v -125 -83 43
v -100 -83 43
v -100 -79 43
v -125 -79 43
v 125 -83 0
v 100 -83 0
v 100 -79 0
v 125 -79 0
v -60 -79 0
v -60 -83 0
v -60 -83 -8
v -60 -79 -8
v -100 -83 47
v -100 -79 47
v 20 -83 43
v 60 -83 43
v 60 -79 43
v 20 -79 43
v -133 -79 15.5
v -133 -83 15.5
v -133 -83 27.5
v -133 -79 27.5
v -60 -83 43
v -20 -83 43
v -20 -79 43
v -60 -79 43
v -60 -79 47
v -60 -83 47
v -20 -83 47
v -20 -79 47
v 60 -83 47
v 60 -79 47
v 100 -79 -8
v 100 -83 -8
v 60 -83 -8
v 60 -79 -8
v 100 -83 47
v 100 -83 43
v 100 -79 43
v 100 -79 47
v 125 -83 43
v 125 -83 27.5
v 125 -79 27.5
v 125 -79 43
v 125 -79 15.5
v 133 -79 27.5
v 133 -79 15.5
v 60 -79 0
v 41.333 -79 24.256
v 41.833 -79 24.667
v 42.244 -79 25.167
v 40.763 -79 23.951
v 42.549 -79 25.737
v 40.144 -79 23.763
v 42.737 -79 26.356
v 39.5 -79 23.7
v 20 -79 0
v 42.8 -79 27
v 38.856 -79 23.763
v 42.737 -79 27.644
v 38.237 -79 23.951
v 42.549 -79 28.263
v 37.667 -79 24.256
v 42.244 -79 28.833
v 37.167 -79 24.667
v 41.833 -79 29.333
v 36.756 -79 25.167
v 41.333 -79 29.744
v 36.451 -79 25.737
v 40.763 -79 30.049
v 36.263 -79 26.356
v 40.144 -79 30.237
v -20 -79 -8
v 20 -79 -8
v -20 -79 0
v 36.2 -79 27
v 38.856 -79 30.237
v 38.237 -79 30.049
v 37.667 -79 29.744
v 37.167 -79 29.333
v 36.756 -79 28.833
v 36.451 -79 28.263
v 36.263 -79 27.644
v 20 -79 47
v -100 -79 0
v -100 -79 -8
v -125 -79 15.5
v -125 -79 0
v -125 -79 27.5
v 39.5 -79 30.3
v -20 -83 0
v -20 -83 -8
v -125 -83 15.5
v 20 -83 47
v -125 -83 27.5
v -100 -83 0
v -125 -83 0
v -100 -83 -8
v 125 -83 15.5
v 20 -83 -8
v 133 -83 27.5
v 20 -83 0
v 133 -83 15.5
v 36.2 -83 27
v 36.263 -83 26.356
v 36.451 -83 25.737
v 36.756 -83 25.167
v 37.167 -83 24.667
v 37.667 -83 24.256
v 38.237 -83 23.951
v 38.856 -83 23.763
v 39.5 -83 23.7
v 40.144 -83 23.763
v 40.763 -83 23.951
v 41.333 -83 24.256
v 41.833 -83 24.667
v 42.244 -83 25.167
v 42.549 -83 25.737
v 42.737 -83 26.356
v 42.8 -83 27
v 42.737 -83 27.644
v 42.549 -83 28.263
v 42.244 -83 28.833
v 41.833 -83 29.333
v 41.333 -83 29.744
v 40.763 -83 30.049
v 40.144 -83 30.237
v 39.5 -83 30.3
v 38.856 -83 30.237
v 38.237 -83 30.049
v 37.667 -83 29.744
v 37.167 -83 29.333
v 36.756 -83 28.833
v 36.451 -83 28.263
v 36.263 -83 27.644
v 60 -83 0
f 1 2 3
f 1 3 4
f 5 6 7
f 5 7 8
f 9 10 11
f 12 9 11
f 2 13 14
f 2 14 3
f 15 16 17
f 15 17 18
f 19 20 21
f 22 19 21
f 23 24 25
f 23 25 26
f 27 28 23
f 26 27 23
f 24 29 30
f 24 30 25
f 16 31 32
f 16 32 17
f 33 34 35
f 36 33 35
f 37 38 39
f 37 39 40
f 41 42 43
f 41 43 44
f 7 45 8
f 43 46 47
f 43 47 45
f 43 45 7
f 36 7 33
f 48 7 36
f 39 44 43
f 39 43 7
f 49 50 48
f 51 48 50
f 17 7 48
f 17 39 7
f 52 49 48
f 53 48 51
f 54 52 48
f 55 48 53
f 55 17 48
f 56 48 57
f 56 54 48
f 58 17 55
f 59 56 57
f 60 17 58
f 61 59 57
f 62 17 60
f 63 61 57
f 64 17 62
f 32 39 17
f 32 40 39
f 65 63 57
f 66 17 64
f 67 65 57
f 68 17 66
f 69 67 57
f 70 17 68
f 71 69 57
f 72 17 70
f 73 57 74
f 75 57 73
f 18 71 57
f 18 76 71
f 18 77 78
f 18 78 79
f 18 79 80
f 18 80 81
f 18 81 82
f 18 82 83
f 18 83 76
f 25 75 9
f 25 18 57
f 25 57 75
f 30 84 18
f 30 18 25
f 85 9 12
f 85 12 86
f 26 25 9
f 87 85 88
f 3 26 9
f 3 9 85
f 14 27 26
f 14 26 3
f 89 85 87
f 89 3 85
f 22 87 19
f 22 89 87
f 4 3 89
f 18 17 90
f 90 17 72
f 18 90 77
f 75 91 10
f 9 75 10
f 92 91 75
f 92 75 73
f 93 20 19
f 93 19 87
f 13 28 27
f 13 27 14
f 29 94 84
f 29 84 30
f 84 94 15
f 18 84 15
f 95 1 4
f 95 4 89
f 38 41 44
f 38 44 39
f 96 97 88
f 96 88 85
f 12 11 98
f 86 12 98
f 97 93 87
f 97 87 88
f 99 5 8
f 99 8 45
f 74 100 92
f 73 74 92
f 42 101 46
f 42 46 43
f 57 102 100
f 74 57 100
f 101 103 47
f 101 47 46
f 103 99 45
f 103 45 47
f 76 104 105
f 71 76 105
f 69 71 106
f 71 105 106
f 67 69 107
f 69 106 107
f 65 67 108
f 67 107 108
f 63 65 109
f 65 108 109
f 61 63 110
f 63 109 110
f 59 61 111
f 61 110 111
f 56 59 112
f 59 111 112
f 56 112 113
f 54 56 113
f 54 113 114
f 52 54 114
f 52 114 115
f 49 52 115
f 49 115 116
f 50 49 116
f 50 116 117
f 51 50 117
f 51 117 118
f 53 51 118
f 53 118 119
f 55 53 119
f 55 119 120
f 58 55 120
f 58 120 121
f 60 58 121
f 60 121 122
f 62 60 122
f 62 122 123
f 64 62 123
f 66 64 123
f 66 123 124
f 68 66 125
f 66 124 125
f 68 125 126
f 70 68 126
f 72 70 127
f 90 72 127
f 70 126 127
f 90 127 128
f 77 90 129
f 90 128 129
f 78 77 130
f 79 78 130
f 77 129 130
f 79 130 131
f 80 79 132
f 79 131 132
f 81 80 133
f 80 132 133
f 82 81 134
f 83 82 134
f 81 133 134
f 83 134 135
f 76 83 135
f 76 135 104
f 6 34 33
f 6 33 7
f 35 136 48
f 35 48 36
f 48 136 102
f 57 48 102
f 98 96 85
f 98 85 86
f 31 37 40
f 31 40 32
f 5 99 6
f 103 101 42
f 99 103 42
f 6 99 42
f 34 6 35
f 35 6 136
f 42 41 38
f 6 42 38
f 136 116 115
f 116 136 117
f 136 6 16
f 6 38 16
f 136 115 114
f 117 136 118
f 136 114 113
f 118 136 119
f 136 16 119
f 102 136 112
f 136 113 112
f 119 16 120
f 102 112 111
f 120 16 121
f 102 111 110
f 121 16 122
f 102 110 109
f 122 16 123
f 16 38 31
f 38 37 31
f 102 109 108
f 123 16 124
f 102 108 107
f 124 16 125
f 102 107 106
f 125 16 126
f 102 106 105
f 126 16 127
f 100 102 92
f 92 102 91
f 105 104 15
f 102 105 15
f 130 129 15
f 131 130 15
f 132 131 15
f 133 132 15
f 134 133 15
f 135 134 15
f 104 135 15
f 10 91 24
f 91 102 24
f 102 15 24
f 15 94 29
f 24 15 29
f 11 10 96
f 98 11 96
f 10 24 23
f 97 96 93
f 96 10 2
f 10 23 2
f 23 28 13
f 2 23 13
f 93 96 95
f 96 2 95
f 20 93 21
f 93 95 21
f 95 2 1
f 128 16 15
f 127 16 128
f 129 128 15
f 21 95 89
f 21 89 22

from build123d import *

# Parameters (mm, degrees)
SKETCH011_W     = 266
SKETCH011_H     = 55
PAD008_DEPTH    = 4
SKETCH021_W     = 40
SKETCH021_H     = 30
POCKET004_DEPTH = 4.001
SKETCH037_R     = 3.3
HOLE002_DEPTH   = 25


with BuildPart() as part:
    # Sketch011 (on DatumPlane) → Pad008 (new body)
    with BuildSketch(Plane(origin=(0, -83, -4), x_dir=(-1, 0, 0), z_dir=(0, 1, 0))):
        with Locations((0, 23.5)):
            Rectangle(SKETCH011_W, SKETCH011_H)
    extrude(amount=PAD008_DEPTH)

    # Sketch021 (on Face5 of Pad008) → Pocket004 (cut, through all)
    with BuildSketch(Plane(origin=(0, -83, -4), x_dir=(-1, 0, 0), z_dir=(0, -1, 0))):
        with Locations((-40, 11)):
            Rectangle(SKETCH021_W, SKETCH021_H)
        with Locations((40, 11)):
            Rectangle(SKETCH021_W, SKETCH021_H)
        Polygon((100, 26), (145, 26), (145, 0.5), (155, 0.5), (155, -19.5), (125, -19.5), (125, -4), (100, -4), align=None)
        Polygon((-145, 26), (-100, 26), (-100, -4), (-125, -4), (-125, -19.5), (-155, -19.5), (-155, 0.5), (-145, 0.5), align=None)
        Polygon((-125, -47), (-100, -47), (-100, -77), (-145, -77), (-145, -51.5), (-155, -51.5), (-155, -31.5), (-125, -31.5), align=None)
        with Locations((-40, -62)):
            Rectangle(SKETCH021_W, SKETCH021_H)
        with Locations((40, -62)):
            Rectangle(SKETCH021_W, SKETCH021_H)
        Polygon((100, -47), (125, -47), (125, -31.5), (155, -31.5), (155, -51.5), (145, -51.5), (145, -77), (100, -77), align=None)
    extrude(amount=-POCKET004_DEPTH, mode=Mode.SUBTRACT)

    # Sketch037 (on Face2 of Pocket004) → Hole002 (cut)
    with BuildSketch(Plane(origin=(0, -83, -4), x_dir=(-1, 0, 0), z_dir=(0, -1, 0))):
        with Locations((-39.5, -31)):
            Circle(SKETCH037_R)
    extrude(amount=-HOLE002_DEPTH, mode=Mode.SUBTRACT)


solid = part.part
